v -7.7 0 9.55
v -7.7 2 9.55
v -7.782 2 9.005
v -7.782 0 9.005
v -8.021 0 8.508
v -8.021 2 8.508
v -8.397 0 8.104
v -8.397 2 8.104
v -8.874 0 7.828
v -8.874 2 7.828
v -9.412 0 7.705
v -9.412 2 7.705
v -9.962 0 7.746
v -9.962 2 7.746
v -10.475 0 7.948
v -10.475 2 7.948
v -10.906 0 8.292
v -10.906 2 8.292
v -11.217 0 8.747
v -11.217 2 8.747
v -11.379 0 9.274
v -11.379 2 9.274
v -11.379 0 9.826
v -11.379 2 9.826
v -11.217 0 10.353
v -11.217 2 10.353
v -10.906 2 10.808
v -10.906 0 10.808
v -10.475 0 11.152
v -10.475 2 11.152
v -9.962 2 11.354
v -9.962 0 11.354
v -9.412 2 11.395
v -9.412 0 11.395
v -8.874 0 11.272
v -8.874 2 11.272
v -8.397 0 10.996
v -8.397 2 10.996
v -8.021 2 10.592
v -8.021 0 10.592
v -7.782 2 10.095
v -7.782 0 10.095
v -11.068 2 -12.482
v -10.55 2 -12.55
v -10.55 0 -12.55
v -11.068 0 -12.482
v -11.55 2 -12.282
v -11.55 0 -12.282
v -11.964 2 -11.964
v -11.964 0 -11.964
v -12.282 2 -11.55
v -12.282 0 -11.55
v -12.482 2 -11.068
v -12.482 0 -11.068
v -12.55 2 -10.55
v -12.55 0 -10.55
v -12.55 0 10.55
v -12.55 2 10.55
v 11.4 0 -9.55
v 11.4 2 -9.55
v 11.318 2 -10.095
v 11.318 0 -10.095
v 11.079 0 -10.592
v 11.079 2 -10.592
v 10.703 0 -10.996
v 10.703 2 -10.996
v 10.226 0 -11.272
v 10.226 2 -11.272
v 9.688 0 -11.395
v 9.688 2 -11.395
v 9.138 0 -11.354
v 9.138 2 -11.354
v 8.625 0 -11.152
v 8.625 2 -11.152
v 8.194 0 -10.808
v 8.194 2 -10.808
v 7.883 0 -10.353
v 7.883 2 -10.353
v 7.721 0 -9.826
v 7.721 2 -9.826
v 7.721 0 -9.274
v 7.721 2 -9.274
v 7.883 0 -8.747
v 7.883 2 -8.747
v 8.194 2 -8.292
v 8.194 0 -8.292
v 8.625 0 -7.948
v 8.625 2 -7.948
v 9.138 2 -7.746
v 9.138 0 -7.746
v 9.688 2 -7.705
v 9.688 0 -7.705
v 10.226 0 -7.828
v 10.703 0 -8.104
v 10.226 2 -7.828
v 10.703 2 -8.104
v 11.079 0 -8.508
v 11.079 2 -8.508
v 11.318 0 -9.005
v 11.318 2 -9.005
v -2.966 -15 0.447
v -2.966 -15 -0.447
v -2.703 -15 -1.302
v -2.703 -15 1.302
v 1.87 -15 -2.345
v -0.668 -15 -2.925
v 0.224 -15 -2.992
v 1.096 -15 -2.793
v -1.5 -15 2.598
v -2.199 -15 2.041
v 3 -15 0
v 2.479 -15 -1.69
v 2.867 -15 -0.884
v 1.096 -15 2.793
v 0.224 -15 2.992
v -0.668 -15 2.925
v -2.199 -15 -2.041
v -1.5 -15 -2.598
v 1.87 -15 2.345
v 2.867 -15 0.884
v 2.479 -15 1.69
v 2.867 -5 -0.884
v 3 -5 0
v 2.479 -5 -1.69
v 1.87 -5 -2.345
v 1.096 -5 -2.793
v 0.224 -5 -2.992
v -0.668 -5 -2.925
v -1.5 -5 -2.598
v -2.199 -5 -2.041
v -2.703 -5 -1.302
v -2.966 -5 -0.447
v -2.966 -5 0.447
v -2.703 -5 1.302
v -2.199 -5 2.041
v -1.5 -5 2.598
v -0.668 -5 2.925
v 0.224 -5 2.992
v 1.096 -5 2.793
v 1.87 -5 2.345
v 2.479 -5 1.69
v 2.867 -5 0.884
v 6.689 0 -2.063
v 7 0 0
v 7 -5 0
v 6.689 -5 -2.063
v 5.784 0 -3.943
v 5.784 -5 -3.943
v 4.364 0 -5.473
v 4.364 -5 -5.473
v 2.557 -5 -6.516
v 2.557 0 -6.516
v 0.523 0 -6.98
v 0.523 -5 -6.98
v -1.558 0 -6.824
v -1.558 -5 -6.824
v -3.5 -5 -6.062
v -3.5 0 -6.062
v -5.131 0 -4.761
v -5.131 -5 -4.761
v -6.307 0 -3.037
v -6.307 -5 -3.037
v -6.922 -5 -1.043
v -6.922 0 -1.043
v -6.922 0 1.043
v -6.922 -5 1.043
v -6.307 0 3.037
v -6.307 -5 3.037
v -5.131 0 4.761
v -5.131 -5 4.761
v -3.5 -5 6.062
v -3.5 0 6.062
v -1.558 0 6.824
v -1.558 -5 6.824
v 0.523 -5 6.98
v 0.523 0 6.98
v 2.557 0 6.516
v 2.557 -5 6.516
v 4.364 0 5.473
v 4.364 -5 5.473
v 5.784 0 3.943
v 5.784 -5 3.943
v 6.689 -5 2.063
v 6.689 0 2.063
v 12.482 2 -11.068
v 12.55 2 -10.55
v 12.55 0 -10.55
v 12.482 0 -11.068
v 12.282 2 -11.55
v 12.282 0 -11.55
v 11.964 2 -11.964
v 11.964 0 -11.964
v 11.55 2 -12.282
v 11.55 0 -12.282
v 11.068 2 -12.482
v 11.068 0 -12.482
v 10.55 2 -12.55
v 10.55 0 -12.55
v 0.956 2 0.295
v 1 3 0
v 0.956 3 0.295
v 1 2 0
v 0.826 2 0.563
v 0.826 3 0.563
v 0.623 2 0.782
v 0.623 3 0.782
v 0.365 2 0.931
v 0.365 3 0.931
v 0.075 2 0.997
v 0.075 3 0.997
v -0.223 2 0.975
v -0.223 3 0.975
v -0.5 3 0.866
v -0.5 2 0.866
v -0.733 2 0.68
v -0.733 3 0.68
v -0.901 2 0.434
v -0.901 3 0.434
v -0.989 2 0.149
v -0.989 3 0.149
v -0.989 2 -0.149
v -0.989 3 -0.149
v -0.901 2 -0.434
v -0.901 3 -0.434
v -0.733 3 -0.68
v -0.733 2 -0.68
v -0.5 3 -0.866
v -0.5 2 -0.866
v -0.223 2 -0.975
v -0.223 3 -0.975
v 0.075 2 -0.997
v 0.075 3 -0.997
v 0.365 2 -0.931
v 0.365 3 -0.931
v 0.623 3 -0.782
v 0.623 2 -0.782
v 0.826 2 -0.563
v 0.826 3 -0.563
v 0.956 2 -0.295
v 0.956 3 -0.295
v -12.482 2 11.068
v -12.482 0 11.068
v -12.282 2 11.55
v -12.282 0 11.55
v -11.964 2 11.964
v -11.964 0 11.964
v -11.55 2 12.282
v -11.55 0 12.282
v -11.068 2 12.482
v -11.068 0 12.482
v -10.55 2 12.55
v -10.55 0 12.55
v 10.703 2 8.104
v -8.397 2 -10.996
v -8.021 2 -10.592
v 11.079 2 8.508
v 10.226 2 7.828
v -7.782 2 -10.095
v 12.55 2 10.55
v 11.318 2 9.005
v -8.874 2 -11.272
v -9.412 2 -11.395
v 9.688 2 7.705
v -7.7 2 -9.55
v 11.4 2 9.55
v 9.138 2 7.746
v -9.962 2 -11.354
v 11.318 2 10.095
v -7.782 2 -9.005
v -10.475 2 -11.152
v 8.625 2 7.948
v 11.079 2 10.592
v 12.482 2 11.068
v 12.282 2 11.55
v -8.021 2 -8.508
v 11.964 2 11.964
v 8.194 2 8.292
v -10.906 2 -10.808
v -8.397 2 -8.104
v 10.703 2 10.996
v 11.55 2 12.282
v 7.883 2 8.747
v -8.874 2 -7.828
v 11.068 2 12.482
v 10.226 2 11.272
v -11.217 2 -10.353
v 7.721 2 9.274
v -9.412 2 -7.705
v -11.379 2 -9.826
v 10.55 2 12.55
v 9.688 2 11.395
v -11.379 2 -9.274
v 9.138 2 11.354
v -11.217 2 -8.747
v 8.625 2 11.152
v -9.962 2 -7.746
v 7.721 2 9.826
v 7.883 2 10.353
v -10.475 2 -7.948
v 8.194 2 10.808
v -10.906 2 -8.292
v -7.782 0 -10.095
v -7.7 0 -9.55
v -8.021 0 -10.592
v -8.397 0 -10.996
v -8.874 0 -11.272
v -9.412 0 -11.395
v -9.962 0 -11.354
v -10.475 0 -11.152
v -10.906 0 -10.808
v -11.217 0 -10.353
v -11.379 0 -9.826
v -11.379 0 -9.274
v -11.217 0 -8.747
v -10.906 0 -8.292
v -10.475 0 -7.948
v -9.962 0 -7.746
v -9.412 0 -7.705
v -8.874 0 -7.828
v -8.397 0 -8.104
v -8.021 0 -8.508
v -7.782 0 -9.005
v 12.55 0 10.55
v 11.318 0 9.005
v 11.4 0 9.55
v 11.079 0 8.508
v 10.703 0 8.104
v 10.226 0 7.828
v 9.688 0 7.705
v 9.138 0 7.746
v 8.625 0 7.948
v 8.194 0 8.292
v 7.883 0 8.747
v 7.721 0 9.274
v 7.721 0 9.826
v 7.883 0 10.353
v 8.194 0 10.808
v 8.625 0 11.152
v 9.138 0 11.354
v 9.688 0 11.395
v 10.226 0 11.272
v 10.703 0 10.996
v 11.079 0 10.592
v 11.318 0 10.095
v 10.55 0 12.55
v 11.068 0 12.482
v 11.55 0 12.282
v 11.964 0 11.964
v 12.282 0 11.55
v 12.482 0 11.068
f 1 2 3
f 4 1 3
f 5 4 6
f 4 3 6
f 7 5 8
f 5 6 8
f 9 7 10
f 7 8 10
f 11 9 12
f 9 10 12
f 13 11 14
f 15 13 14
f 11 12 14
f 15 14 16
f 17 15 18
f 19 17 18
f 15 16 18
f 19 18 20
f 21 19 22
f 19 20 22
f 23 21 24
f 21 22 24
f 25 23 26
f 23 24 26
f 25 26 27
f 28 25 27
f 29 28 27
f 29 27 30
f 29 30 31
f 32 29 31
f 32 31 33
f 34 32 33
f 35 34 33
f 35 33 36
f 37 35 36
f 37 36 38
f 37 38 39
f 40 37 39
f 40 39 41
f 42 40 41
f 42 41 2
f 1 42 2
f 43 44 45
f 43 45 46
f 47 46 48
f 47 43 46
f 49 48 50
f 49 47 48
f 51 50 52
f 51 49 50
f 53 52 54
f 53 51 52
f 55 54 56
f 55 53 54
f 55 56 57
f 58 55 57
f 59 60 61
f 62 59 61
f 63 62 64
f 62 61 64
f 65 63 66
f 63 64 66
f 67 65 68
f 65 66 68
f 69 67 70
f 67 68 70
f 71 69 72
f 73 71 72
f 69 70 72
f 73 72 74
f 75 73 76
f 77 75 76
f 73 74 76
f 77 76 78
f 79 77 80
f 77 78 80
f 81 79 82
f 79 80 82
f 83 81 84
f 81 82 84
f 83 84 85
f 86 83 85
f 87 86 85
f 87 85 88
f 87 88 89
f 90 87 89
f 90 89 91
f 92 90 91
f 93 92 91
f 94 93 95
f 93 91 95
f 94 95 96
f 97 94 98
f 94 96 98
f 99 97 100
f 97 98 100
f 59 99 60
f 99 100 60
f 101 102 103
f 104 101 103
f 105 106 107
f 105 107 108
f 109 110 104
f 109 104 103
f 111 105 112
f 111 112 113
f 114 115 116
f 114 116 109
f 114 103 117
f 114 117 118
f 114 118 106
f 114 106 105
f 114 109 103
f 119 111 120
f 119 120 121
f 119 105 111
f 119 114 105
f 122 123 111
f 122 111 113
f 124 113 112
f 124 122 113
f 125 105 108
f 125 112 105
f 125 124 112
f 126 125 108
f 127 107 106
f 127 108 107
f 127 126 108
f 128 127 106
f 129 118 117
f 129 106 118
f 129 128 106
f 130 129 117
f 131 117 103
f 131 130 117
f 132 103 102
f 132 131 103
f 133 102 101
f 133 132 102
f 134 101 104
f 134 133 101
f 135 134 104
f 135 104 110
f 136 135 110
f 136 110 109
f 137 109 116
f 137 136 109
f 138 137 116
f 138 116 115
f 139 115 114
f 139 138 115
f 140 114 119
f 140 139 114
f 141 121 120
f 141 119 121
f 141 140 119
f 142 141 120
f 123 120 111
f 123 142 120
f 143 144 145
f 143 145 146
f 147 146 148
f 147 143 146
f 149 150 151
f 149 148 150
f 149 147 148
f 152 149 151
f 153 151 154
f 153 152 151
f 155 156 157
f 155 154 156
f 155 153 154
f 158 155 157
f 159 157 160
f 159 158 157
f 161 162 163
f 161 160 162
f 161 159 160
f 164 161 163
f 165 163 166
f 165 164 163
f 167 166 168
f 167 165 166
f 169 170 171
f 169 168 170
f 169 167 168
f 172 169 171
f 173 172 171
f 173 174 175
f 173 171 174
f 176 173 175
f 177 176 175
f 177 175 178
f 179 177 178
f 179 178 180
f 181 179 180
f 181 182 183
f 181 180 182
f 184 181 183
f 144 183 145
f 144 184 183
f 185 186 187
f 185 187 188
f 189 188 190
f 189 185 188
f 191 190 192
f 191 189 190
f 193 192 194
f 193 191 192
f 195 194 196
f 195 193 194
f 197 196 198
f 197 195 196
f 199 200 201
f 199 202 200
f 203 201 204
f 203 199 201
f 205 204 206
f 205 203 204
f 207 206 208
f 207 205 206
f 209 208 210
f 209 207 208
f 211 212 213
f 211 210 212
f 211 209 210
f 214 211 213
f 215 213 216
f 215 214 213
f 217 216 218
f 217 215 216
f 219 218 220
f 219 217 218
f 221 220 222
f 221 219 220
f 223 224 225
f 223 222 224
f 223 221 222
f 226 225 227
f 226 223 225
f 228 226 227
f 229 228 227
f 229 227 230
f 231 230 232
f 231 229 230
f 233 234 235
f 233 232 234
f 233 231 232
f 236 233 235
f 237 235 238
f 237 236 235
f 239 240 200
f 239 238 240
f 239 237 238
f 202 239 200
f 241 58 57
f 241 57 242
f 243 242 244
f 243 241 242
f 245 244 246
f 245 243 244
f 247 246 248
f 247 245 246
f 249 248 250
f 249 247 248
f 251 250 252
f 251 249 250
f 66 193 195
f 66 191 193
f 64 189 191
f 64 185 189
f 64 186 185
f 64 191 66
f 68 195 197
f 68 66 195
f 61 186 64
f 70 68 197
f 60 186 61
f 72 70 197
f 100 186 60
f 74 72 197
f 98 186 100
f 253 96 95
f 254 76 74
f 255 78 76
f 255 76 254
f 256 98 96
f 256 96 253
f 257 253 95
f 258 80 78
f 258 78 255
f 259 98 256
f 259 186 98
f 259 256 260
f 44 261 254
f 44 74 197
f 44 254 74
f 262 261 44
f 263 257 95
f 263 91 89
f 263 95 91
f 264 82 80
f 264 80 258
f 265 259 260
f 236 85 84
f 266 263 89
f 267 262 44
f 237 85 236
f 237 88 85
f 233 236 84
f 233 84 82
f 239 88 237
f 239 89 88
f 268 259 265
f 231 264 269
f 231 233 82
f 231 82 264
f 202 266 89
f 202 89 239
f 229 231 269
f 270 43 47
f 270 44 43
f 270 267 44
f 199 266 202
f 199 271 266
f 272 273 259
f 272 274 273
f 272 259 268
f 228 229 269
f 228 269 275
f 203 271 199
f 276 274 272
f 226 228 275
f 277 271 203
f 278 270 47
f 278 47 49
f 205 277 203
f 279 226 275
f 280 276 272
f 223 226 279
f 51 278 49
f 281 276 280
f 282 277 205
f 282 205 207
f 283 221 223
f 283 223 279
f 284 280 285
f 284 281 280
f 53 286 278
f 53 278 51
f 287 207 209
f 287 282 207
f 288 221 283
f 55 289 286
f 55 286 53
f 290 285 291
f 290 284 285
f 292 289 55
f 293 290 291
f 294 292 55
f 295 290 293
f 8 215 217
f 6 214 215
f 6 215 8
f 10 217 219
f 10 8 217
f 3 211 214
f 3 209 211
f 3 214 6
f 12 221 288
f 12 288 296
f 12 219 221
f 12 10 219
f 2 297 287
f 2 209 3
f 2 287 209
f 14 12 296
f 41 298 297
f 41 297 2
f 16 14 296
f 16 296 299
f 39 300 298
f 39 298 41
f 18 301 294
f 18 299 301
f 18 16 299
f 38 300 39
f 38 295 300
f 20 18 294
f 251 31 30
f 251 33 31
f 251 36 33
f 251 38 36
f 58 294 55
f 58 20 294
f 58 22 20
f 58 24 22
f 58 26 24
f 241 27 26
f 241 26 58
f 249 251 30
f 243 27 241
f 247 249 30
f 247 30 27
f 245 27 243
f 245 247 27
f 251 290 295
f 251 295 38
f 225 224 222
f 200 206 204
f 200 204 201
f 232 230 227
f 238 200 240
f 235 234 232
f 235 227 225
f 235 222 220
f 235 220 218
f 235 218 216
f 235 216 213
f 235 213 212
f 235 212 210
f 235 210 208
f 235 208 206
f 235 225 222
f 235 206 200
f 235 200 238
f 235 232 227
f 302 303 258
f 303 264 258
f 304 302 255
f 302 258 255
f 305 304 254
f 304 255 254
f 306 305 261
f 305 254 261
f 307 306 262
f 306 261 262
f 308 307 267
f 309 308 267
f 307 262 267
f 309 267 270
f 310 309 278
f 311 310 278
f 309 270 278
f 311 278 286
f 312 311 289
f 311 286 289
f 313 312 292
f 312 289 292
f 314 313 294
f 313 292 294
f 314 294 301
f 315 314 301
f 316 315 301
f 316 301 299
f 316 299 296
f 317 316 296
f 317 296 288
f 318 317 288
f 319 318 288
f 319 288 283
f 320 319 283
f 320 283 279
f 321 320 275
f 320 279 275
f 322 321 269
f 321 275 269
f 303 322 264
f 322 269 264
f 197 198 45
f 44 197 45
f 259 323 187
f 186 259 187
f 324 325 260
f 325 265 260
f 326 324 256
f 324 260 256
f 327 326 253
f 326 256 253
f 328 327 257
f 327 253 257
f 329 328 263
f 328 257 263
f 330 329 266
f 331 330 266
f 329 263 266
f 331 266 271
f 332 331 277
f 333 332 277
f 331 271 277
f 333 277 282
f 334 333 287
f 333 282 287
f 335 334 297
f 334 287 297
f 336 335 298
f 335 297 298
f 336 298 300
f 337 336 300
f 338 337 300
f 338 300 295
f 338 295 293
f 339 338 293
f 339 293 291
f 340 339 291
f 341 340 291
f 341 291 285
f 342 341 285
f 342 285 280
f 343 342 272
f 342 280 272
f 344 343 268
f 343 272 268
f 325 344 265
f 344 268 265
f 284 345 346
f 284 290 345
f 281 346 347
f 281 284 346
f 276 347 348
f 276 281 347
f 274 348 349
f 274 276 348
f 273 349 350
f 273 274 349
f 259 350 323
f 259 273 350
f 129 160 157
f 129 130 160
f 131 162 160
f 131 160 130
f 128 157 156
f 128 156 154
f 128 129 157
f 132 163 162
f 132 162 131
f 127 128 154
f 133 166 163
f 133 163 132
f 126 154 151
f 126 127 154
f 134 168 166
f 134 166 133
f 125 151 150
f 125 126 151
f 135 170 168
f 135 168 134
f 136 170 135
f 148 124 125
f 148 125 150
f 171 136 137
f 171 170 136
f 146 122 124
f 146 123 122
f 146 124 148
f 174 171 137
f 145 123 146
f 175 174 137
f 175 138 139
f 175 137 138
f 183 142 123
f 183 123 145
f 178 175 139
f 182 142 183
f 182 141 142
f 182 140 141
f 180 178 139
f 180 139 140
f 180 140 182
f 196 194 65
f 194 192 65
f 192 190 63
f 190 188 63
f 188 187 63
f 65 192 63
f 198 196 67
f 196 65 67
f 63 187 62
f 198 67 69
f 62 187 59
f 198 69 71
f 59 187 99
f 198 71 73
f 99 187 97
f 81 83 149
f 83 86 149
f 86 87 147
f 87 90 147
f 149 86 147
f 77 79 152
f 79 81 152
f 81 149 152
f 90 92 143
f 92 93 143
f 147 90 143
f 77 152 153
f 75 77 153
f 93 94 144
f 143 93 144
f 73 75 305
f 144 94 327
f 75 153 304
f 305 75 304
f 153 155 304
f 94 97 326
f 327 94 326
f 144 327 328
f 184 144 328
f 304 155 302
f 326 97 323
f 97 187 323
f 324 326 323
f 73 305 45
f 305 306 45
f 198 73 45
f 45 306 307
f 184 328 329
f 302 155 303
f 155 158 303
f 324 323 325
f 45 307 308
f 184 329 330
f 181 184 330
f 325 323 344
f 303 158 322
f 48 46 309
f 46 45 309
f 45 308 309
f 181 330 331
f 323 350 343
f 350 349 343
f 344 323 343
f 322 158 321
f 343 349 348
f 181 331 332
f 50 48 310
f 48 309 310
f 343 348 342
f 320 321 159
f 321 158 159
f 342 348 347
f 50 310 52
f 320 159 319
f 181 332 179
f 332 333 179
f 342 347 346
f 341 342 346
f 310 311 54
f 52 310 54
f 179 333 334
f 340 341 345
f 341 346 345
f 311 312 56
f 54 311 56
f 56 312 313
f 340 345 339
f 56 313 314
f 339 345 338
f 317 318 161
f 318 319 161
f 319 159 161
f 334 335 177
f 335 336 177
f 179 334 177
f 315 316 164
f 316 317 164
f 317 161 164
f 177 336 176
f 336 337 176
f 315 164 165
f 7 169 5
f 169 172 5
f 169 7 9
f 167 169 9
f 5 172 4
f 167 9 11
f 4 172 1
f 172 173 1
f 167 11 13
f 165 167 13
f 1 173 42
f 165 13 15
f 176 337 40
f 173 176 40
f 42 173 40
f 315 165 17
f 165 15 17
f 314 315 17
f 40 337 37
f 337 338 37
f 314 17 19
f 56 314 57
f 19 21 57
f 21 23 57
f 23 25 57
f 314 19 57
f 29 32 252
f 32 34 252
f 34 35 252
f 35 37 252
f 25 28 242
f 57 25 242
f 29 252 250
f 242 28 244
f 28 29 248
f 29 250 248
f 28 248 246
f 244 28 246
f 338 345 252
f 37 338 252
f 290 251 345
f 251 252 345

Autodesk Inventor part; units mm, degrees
ref_plane "YZ Plane" through (0, 0, 0) normal (1, 0, 0) x (0, 1, 0)
ref_plane "XZ Plane" through (0, 0, 0) normal (0, 1, 0) x (-1, 0, 0)
ref_plane "XY Plane" through (0, 0, 0) normal (0, 0, 1) x (1, 0, 0)
sketch "Sketch1" plane through (0, 0, 0) normal (0, 1, 0) x (-1, 0, 0)
  line L0 (12.55, 12.55) -> (-12.55, 12.55)
  line L1 (-12.55, 12.55) -> (-12.55, -12.55)
  line L2 (-12.55, -12.55) -> (12.55, -12.55)
  line L3 (12.55, -12.55) -> (12.55, 12.55)
  point P0 (0, 0)
  point P1 (12.55, 0)
  point P2 (0, -12.55)
  dimension "d0" = 25.1
  dimension "d1" = 25.1
extrude "Extrusion1" add sketch "Sketch1" along normal blind 2
fillet "Fillet1" radius 2 4 edges at (12.55, 1, 12.55) (-12.55, 1, 12.55) (12.55, 1, -12.55) (-12.55, 1, -12.55)
sketch "Sketch2" plane through (0, 2, 0) normal (0, 1, 0) x (1, 0, 0)
  circle A0 centre (-9.55, -9.55) radius 1.85
  line L0 (-12.55, 10.55) -> (-12.55, -10.55) projected
  line L1 (-10.55, -12.55) -> (10.55, -12.55) projected
  line L2 (0, 0) -> (-4.3818, 0) construction
  line L3 (0, 0) -> (0, 4.1079) construction
  circle A1 centre (-9.55, 9.55) radius 1.85
  circle A2 centre (9.55, -9.55) radius 1.85
  circle A3 centre (9.55, 9.55) radius 1.85
  dimension "d5" = 3.7
  dimension "d6" = 3
  dimension "d7" = 3
extrude "Extrusion2" cut sketch "Sketch2" against normal through all
sketch "Sketch3" plane through (0, 2, 0) normal (0, 1, 0) x (1, 0, 0)
  circle A0 centre (0, 0) radius 1
  dimension "d10" = 2
extrude "Extrusion3" add sketch "Sketch3" along normal blind 1
sketch "Sketch4" plane through (0, 0, 0) normal (0, -1, 0) x (1, 0, 0)
  circle A0 centre (0, 0) radius 1 projected
  circle A1 centre (0, 0) radius 7
  dimension "d13" = 14
extrude "Extrusion4" add sketch "Sketch4" along normal blind 5 contours A0 | A1
sketch "Sketch5" plane through (0, -5, 0) normal (0, -1, 0) x (1, 0, 0)
  circle A0 centre (0, 0) radius 1 projected
  circle A1 centre (0, 0) radius 3
  dimension "d16" = 6
extrude "Extrusion5" add sketch "Sketch5" along normal blind 10 contours A0 | A1
properties part number "connector" material "Aluminum 6061"
